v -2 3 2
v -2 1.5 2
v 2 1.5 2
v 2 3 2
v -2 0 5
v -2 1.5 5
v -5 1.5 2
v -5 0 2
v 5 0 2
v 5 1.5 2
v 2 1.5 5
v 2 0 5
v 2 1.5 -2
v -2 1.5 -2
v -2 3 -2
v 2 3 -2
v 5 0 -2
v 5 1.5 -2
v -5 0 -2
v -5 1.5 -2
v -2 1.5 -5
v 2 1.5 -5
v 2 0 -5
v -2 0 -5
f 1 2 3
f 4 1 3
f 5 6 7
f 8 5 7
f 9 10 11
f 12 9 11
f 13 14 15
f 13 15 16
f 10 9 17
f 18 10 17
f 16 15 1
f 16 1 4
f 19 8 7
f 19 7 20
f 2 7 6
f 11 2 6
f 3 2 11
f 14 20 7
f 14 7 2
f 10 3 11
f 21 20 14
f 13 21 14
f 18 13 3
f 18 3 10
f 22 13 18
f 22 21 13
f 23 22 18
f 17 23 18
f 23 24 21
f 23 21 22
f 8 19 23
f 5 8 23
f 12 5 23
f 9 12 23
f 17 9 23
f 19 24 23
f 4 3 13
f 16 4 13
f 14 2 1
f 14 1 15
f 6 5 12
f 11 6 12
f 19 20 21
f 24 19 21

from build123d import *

# Parameters (mm, degrees)
SKETCH1_W           = 10
SKETCH1_H           = 10
BOSS_EXTRUDE1_DEPTH = 1.5
SKETCH2_W           = 4
SKETCH2_H           = 4
BOSS_EXTRUDE2_DEPTH = 1.5
CUT_EXTRUDE1_DEPTH  = 1.5
CIRPATTERN1_COUNT   = 4


with BuildPart() as part:
    # Sketch1 → Boss-Extrude1 (new body)
    with BuildSketch(Plane(origin=(0, 0, 0), x_dir=(1, 0, 0), z_dir=(0, 1, 0))):
        Rectangle(SKETCH1_W, SKETCH1_H)
    extrude(amount=BOSS_EXTRUDE1_DEPTH)

    # Sketch2 → Boss-Extrude2 (add)
    with BuildSketch(Plane(origin=(0, 1.5, 0), x_dir=(1, 0, 0), z_dir=(0, 1, 0))):
        Rectangle(SKETCH2_W, SKETCH2_H)
    extrude(amount=BOSS_EXTRUDE2_DEPTH)

    # Sketch3 → Cut-Extrude1 (cut)
    with BuildSketch(Plane(origin=(0, 1.5, 0), x_dir=(1, 0, 0), z_dir=(0, 1, 0))):
        Polygon((-5, 2), (-2, 5), (-5, 5), align=None)
    cut_extrude1 = extrude(amount=-CUT_EXTRUDE1_DEPTH, mode=Mode.SUBTRACT)

    # CirPattern1: Cut-Extrude1 ×4 about axis
    cirpattern1_axis = Axis((0, 0, 0), (0, 1, 0))
    for i in range(1, CIRPATTERN1_COUNT):
        add(cut_extrude1.rotate(cirpattern1_axis, i * 360 / CIRPATTERN1_COUNT), mode=Mode.SUBTRACT)


solid = part.part
